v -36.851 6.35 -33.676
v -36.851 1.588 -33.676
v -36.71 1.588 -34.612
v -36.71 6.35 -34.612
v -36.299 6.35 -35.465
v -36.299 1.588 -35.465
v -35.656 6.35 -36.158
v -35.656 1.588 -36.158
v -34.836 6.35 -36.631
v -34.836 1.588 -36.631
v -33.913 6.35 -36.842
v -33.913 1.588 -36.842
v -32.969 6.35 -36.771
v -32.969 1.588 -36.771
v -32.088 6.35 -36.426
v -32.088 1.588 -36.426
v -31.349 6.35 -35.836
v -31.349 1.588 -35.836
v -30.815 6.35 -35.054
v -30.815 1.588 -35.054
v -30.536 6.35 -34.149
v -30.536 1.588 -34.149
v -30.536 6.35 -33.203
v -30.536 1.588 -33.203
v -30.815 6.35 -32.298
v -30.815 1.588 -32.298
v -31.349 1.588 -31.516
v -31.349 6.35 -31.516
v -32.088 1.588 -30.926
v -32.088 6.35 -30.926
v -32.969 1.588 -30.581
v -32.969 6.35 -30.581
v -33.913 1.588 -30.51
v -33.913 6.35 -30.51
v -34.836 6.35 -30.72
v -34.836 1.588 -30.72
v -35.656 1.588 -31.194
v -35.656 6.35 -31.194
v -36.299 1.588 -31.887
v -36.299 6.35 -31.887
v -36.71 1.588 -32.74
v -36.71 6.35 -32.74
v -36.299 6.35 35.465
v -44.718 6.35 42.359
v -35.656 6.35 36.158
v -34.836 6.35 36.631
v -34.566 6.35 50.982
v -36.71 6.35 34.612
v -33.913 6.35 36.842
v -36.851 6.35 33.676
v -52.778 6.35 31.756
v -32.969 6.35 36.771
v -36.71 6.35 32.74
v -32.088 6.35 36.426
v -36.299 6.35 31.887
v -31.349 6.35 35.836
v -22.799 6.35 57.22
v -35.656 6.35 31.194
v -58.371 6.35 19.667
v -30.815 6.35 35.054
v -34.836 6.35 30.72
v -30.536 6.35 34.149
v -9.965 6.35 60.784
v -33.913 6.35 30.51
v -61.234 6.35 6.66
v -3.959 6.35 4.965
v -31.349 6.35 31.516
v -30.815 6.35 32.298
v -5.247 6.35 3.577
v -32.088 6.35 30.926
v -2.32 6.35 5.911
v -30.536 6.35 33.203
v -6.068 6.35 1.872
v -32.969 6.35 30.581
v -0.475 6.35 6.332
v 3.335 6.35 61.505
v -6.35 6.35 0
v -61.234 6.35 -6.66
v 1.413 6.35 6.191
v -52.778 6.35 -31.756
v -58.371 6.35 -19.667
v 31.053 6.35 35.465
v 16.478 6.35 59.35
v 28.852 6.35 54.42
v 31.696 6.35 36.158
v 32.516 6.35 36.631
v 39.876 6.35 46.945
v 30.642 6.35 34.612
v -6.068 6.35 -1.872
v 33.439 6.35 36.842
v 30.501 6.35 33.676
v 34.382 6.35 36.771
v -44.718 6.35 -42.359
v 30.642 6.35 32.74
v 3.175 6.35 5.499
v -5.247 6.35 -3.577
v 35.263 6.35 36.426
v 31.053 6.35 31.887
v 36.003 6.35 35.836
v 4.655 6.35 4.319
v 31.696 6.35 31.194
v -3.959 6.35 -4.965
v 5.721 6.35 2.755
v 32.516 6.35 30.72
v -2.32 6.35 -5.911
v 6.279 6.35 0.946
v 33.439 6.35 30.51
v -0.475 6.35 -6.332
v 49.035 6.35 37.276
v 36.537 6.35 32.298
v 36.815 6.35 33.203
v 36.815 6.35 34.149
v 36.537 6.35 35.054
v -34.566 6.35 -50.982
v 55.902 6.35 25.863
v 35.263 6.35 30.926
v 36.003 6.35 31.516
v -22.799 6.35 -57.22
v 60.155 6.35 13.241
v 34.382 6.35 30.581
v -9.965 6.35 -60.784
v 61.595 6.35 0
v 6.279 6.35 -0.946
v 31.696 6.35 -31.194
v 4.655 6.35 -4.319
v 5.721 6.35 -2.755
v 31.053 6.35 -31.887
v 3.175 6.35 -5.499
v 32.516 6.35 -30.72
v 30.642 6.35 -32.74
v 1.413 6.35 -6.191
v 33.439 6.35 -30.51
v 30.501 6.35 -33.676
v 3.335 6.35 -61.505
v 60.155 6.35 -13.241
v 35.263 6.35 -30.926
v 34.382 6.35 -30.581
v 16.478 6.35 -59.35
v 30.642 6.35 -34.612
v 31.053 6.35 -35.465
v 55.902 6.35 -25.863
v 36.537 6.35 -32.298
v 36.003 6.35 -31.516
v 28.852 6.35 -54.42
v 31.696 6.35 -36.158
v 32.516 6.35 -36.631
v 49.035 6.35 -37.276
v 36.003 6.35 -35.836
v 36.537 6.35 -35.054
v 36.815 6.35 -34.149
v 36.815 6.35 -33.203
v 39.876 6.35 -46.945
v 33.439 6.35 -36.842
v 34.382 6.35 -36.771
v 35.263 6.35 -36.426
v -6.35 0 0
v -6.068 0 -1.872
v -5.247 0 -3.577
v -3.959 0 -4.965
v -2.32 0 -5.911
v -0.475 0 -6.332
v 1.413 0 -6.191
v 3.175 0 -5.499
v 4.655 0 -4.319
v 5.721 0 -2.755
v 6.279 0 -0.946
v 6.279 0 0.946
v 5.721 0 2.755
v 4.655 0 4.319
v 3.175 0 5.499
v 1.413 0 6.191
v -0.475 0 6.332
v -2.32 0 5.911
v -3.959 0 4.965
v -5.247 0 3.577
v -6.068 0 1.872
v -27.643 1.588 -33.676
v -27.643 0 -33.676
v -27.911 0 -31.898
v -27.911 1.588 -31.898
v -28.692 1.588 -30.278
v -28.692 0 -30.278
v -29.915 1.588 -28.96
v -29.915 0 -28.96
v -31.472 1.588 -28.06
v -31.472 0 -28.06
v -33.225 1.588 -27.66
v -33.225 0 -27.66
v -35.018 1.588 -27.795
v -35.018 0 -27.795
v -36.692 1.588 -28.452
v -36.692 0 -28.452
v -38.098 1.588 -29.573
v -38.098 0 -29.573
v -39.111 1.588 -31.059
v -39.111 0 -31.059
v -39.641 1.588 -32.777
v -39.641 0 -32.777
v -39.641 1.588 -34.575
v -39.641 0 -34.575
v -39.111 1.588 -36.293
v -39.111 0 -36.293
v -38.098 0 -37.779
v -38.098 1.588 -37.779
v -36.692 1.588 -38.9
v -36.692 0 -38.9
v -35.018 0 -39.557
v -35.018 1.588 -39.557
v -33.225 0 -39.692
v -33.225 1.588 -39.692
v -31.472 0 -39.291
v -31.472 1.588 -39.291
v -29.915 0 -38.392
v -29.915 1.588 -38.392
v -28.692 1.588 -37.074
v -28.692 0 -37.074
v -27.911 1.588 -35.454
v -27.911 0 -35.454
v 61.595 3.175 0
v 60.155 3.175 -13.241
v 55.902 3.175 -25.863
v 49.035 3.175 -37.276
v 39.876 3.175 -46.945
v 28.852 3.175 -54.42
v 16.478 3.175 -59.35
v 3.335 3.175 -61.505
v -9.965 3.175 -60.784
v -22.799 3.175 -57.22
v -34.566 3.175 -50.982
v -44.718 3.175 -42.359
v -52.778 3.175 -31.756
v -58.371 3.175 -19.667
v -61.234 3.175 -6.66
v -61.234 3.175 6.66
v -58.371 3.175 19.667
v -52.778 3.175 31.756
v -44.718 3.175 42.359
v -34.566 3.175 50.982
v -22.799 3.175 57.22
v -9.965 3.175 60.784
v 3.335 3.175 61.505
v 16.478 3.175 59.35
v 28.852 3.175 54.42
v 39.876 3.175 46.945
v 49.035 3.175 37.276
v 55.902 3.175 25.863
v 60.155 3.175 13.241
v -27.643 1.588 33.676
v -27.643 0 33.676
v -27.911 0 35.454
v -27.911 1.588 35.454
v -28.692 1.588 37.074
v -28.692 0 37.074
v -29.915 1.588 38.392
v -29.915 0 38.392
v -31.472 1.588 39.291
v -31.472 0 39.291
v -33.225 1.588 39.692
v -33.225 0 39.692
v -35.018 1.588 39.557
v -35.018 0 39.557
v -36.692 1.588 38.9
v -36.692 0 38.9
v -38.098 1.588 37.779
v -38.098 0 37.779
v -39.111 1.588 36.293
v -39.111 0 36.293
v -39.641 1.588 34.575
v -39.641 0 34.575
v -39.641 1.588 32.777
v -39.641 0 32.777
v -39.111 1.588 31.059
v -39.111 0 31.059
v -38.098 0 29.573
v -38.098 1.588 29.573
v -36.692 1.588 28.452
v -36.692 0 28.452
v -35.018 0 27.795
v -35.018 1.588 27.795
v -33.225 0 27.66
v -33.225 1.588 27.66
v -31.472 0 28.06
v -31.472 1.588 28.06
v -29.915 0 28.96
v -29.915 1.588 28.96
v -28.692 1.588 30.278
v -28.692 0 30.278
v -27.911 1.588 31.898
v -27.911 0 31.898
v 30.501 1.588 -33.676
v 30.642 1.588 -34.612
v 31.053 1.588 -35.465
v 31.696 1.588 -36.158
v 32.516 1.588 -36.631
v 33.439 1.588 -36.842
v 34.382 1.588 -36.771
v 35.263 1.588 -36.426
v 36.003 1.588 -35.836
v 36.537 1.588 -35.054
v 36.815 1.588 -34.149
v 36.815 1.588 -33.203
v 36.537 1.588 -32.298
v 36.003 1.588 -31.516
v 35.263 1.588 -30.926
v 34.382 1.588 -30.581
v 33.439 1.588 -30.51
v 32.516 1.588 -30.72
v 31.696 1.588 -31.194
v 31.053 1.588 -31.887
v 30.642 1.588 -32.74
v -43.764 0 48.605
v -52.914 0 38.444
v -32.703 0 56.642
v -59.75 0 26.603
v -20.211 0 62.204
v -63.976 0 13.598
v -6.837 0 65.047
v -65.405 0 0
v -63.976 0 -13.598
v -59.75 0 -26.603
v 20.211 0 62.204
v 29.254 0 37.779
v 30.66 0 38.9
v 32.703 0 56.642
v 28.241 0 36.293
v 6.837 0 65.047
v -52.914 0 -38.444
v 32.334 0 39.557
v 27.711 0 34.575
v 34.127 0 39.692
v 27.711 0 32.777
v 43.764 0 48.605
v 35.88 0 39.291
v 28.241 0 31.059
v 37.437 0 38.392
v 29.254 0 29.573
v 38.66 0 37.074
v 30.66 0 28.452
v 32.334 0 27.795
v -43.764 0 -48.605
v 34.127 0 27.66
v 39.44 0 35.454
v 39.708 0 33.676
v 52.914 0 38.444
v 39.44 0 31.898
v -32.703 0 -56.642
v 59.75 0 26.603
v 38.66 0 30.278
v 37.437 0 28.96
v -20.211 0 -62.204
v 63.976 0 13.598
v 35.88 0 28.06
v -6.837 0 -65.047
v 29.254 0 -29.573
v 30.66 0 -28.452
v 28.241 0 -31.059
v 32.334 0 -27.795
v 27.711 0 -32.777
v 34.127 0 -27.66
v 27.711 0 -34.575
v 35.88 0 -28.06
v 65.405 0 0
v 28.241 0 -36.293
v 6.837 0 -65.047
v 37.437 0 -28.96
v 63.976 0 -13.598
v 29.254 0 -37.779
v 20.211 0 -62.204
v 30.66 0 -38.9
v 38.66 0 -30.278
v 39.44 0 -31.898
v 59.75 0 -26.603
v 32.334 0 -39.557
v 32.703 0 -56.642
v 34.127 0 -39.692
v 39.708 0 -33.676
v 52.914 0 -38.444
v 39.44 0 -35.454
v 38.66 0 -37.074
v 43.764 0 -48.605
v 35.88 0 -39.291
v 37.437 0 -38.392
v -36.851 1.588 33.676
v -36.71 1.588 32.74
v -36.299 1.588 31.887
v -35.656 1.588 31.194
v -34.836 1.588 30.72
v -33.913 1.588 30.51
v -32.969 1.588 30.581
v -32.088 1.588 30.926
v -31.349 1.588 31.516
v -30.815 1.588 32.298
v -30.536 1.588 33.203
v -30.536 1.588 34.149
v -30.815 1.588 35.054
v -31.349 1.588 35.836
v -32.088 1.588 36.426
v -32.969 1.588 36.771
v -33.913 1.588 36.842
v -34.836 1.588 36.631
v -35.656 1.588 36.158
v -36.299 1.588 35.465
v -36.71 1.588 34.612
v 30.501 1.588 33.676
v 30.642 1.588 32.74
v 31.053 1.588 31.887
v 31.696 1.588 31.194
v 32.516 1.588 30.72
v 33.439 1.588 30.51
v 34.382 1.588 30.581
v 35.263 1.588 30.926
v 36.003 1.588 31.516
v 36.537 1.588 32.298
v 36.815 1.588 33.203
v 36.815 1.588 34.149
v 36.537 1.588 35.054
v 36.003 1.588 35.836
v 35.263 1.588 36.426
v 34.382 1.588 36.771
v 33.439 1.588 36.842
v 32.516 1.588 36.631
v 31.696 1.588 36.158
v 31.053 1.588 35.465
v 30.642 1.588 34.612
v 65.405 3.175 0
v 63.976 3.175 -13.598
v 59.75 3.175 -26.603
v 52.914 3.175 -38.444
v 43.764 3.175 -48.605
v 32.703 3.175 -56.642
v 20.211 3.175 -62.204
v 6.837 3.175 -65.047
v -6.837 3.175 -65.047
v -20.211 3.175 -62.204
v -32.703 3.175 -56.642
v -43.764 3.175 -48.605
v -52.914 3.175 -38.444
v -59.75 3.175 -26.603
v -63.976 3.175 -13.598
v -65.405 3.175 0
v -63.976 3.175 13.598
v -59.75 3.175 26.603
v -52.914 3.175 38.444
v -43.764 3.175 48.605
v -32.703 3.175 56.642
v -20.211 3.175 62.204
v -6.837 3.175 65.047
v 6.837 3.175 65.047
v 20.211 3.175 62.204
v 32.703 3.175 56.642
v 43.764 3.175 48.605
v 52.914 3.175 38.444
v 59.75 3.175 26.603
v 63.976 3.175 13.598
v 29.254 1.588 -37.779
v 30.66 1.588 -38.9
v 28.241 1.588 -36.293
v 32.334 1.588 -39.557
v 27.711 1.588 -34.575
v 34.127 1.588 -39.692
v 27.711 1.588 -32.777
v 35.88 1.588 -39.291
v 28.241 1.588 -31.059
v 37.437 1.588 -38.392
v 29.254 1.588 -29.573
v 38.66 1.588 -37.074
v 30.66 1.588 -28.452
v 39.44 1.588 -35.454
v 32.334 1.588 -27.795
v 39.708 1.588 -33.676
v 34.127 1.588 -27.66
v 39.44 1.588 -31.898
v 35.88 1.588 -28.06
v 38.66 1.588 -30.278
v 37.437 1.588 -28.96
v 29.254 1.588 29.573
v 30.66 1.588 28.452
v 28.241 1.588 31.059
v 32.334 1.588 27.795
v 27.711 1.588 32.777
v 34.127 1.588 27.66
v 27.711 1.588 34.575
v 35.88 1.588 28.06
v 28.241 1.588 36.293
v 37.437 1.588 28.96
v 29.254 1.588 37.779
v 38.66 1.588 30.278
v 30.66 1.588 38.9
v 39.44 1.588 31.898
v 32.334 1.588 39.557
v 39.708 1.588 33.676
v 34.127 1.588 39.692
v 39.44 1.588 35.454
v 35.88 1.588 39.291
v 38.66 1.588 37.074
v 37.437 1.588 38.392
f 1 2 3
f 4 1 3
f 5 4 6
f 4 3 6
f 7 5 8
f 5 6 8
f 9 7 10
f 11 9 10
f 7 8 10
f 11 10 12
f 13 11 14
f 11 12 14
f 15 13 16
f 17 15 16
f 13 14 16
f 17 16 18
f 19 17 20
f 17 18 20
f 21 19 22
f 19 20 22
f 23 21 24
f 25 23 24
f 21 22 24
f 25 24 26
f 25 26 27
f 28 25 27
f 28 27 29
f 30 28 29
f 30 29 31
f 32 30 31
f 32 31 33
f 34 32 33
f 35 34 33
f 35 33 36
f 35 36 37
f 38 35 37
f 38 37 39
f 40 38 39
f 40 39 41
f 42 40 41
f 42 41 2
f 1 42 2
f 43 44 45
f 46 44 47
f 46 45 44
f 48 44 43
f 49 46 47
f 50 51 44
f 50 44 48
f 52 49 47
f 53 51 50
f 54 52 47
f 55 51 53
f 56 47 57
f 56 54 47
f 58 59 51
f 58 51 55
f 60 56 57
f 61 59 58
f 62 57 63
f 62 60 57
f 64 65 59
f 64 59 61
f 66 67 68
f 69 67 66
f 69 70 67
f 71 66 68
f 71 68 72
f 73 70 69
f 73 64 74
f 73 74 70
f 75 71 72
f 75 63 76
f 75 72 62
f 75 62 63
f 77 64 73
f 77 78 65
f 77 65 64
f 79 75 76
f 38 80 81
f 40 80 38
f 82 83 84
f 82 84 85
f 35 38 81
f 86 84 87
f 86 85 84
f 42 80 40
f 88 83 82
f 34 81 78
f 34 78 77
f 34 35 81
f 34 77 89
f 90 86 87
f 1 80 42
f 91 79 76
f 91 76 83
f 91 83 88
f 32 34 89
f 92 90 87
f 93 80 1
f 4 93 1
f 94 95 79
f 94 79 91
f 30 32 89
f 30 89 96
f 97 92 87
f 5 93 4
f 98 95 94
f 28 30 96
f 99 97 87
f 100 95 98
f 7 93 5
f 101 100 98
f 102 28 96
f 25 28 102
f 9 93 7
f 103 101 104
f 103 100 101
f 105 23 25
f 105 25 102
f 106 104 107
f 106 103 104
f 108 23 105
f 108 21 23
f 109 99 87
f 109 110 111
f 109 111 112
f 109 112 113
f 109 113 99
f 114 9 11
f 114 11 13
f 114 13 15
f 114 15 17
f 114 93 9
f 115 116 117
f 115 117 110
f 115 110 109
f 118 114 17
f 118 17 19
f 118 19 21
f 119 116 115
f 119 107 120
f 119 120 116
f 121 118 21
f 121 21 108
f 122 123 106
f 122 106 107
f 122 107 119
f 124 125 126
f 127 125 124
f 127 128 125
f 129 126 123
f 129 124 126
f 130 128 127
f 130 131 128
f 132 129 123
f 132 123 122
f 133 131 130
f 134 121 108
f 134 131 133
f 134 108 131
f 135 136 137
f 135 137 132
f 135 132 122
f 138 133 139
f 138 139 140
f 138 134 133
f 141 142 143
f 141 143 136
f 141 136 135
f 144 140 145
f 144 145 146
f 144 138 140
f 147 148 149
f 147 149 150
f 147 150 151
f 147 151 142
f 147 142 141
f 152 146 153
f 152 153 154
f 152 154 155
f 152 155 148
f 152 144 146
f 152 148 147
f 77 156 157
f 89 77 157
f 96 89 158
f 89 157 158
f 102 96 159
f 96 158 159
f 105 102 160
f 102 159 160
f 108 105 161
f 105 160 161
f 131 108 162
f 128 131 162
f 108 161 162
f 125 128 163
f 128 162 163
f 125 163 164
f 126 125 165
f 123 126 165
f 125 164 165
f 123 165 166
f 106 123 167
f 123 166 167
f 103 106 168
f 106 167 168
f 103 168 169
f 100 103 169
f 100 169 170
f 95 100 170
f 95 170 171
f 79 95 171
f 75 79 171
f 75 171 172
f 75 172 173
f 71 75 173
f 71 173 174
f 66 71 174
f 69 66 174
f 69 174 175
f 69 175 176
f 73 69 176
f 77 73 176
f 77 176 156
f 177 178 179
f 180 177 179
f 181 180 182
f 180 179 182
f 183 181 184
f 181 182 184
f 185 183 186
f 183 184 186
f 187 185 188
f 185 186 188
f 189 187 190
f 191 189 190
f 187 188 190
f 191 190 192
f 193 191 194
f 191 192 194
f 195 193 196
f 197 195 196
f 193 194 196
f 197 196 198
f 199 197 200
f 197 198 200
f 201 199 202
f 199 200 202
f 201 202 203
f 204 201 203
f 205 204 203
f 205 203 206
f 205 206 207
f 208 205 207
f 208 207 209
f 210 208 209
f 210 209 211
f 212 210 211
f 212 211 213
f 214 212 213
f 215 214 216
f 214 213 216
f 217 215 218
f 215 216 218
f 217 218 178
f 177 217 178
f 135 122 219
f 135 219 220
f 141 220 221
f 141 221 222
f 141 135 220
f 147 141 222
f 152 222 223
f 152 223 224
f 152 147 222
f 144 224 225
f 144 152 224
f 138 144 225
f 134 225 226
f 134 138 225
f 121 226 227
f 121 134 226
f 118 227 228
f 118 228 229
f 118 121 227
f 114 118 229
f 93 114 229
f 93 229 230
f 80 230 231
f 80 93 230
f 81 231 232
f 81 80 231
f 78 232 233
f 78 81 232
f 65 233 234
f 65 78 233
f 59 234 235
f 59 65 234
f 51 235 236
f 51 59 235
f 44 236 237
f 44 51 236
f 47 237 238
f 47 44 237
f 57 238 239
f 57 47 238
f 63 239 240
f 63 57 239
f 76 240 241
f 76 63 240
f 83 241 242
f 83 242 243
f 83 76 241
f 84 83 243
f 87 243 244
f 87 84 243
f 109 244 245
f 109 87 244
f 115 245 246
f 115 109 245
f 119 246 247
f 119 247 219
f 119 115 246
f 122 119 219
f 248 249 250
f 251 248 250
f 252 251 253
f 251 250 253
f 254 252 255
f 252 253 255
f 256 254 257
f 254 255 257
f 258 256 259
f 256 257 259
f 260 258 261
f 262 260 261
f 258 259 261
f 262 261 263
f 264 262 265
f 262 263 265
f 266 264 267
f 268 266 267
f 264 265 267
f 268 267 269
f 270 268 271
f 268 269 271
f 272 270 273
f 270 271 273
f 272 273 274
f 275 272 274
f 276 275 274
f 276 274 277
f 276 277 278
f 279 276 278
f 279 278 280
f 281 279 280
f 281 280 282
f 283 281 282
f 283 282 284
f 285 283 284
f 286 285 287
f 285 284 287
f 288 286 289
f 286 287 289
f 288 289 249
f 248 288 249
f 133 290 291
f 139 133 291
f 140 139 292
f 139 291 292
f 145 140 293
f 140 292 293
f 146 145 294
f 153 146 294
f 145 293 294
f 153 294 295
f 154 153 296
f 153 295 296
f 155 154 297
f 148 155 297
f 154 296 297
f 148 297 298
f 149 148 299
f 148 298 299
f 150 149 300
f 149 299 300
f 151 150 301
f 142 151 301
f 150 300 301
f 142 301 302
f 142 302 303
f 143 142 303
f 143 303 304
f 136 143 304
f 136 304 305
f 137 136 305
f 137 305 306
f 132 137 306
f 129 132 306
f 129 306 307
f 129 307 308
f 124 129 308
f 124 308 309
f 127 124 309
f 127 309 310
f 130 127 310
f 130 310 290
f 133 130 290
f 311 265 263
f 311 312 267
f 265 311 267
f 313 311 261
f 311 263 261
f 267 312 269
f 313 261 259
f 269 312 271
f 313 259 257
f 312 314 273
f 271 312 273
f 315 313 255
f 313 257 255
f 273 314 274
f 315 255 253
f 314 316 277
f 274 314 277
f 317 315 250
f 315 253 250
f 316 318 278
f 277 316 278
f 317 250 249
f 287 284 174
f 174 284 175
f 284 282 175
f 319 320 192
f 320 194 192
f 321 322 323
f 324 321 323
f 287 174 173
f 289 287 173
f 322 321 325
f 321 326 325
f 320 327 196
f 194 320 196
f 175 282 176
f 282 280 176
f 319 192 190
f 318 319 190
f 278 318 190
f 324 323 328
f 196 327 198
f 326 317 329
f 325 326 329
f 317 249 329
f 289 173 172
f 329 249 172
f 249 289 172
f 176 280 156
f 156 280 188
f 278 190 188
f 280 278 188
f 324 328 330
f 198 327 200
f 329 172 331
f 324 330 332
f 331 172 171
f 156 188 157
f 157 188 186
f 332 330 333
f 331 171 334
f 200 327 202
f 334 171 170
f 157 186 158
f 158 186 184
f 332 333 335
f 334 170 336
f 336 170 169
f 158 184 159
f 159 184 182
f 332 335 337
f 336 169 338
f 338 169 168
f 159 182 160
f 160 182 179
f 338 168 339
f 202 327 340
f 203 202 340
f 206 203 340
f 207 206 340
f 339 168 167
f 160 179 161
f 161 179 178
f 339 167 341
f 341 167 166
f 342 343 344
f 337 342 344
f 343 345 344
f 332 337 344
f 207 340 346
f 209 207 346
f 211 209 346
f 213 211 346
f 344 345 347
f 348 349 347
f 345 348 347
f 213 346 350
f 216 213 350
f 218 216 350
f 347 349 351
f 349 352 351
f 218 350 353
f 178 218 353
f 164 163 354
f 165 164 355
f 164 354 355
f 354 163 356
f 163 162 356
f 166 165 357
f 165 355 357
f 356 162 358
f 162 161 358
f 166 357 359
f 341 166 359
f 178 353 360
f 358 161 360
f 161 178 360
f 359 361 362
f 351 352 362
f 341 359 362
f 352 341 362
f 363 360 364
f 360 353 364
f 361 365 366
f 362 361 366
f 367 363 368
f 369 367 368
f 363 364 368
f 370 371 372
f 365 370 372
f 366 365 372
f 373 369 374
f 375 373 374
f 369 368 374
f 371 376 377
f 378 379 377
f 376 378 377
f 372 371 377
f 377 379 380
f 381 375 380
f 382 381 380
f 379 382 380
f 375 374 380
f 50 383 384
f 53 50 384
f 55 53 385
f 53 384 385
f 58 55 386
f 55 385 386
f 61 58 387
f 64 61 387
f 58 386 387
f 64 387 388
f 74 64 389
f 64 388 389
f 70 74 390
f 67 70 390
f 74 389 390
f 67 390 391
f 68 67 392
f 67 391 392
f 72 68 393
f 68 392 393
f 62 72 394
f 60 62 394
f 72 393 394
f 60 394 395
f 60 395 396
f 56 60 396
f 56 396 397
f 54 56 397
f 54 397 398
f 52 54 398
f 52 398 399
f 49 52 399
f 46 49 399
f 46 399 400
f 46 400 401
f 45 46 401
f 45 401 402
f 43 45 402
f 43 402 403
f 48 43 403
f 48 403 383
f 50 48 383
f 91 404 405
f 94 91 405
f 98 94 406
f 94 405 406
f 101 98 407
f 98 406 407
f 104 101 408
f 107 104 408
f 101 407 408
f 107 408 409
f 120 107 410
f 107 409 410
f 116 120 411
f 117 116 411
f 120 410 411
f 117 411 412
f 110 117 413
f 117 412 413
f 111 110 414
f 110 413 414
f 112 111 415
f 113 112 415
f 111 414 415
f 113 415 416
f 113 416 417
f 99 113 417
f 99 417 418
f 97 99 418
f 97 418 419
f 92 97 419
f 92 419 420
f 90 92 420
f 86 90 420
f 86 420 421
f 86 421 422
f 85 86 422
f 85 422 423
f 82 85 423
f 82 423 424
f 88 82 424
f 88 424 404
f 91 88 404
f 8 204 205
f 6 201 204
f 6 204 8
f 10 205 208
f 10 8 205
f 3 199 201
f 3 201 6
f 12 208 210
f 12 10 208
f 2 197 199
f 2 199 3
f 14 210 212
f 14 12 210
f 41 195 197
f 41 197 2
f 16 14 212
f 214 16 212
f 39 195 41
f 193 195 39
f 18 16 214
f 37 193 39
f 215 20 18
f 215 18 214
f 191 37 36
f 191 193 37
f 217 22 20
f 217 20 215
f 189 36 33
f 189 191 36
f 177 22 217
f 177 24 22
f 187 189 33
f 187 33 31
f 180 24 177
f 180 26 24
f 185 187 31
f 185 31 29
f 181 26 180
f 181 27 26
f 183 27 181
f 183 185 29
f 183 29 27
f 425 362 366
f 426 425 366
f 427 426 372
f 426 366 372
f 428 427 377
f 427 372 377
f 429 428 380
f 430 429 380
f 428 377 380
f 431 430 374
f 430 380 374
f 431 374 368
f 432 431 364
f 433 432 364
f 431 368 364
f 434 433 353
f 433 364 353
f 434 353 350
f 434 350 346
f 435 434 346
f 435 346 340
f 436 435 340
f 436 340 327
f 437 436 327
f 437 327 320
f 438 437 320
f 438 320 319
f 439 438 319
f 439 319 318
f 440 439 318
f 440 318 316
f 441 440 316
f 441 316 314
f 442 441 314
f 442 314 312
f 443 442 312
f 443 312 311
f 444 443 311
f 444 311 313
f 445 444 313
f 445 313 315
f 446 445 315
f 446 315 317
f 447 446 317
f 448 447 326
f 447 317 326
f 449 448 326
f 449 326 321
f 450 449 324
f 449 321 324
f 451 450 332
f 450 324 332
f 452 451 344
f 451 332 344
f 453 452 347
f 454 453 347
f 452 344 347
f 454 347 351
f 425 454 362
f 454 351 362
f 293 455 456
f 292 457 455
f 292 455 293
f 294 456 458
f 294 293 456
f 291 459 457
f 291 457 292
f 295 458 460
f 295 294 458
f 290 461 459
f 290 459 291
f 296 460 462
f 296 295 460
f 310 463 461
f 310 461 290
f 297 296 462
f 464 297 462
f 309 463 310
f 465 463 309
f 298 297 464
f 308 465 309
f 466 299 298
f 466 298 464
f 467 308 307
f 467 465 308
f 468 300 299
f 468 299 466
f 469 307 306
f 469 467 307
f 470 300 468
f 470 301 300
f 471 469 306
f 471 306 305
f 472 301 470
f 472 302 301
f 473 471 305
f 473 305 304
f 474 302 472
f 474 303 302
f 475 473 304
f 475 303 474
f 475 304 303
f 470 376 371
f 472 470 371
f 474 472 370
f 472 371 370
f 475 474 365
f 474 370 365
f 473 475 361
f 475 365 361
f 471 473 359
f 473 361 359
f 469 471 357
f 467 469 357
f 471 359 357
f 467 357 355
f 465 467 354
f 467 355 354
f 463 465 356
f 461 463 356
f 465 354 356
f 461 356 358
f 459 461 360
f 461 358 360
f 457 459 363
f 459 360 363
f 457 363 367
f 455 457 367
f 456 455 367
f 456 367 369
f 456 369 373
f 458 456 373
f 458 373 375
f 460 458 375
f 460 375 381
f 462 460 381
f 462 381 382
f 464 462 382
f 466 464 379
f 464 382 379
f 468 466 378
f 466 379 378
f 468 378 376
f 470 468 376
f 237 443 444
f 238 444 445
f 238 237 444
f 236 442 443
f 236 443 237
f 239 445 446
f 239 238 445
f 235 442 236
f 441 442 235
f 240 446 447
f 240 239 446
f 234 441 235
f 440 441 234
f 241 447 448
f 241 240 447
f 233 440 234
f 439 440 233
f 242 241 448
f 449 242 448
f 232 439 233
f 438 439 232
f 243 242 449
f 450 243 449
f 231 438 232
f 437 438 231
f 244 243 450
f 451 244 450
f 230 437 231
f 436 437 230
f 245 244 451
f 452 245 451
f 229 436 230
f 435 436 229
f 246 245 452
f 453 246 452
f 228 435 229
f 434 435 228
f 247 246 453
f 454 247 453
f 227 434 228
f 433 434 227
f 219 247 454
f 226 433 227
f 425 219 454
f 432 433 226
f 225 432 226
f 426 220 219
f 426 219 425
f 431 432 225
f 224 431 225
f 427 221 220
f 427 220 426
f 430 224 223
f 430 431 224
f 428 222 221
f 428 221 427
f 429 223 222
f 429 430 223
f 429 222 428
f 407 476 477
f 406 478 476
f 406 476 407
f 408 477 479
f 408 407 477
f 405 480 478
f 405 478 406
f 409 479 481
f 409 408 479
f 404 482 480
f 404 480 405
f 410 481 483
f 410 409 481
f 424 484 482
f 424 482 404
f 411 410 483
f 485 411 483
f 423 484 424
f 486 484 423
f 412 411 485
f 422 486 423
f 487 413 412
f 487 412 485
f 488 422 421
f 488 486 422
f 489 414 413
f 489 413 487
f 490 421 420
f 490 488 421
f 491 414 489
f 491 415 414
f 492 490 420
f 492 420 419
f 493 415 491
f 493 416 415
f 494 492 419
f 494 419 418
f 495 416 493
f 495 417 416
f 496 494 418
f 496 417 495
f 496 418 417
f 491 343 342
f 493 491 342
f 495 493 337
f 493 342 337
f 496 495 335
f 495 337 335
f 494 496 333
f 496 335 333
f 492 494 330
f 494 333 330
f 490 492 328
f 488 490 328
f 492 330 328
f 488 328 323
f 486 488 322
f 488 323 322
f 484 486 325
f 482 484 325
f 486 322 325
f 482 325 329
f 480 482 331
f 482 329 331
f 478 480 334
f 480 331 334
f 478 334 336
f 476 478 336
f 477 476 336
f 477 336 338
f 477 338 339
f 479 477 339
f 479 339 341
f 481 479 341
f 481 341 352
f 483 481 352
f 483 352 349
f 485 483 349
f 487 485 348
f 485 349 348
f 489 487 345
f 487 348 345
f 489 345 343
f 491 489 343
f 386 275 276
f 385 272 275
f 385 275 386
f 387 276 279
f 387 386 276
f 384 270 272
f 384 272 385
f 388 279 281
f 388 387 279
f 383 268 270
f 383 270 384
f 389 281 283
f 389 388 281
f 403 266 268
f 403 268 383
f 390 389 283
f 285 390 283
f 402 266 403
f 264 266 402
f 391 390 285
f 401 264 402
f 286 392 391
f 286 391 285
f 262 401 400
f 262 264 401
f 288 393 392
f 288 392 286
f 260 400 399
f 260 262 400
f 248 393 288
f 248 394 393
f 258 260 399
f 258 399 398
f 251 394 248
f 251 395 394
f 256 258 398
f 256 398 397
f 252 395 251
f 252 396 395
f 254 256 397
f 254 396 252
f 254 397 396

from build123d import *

# Parameters (mm, degrees)
SKETCH2_R                   = 65.405
BOSS_EXTRUDE1_DEPTH         = 6.35
SKETCH4_R                   = 65.405
SKETCH4_R_2                 = 61.595
CUT_EXTRUDE1_DEPTH          = 3.175
F_1_4_0_25_DIAMETER_HOLE1_D = 6.35
F_1_2_0_5_DIAMETER_HOLE1_D  = 12.7
SKETCH9_R                   = 6.0325
CUT_EXTRUDE2_DEPTH          = 1.5875


with BuildPart() as part:
    # Sketch2 → Boss-Extrude1 (new body)
    with BuildSketch(Plane(origin=(0, 0, 0), x_dir=(1, 0, 0), z_dir=(0, 1, 0))):
        Circle(SKETCH2_R)
    extrude(amount=BOSS_EXTRUDE1_DEPTH)

    # Sketch4 → Cut-Extrude1 (cut)
    with BuildSketch(Plane(origin=(0, 6.35, 0), x_dir=(1, 0, 0), z_dir=(0, 1, 0))):
        Circle(SKETCH4_R)
        Circle(SKETCH4_R_2, mode=Mode.SUBTRACT)
    extrude(amount=-CUT_EXTRUDE1_DEPTH, mode=Mode.SUBTRACT)

    # 1/4 (0.25) Diameter Hole1 (through all)
    with Locations(Plane(origin=(0, 6.35, 0), x_dir=(1, 0, 0), z_dir=(0, 1, 0))):
        with Locations((-33.675960454, 33.675960454), (-33.675960454, -33.675960454), (33.675960454, 33.675960454), (33.675960454, -33.675960454)):
            Hole(F_1_4_0_25_DIAMETER_HOLE1_D / 2)

    # 1/2 (0.5) Diameter Hole1 (through all)
    with Locations(Plane(origin=(0, 6.35, 0), x_dir=(1, 0, 0), z_dir=(0, 1, 0))):
        with Locations((0, 0)):
            Hole(F_1_2_0_5_DIAMETER_HOLE1_D / 2)

    # Sketch9 → Cut-Extrude2 (cut)
    with BuildSketch(Plane.XZ):
        with Locations((-33.675960454, 33.675960454)):
            Circle(SKETCH9_R)
        with Locations((33.675960454, 33.675960454)):
            Circle(SKETCH9_R)
        with Locations((33.675960454, -33.675960454)):
            Circle(SKETCH9_R)
        with Locations((-33.675960454, -33.675960454)):
            Circle(SKETCH9_R)
    extrude(amount=-CUT_EXTRUDE2_DEPTH, mode=Mode.SUBTRACT)


solid = part.part
